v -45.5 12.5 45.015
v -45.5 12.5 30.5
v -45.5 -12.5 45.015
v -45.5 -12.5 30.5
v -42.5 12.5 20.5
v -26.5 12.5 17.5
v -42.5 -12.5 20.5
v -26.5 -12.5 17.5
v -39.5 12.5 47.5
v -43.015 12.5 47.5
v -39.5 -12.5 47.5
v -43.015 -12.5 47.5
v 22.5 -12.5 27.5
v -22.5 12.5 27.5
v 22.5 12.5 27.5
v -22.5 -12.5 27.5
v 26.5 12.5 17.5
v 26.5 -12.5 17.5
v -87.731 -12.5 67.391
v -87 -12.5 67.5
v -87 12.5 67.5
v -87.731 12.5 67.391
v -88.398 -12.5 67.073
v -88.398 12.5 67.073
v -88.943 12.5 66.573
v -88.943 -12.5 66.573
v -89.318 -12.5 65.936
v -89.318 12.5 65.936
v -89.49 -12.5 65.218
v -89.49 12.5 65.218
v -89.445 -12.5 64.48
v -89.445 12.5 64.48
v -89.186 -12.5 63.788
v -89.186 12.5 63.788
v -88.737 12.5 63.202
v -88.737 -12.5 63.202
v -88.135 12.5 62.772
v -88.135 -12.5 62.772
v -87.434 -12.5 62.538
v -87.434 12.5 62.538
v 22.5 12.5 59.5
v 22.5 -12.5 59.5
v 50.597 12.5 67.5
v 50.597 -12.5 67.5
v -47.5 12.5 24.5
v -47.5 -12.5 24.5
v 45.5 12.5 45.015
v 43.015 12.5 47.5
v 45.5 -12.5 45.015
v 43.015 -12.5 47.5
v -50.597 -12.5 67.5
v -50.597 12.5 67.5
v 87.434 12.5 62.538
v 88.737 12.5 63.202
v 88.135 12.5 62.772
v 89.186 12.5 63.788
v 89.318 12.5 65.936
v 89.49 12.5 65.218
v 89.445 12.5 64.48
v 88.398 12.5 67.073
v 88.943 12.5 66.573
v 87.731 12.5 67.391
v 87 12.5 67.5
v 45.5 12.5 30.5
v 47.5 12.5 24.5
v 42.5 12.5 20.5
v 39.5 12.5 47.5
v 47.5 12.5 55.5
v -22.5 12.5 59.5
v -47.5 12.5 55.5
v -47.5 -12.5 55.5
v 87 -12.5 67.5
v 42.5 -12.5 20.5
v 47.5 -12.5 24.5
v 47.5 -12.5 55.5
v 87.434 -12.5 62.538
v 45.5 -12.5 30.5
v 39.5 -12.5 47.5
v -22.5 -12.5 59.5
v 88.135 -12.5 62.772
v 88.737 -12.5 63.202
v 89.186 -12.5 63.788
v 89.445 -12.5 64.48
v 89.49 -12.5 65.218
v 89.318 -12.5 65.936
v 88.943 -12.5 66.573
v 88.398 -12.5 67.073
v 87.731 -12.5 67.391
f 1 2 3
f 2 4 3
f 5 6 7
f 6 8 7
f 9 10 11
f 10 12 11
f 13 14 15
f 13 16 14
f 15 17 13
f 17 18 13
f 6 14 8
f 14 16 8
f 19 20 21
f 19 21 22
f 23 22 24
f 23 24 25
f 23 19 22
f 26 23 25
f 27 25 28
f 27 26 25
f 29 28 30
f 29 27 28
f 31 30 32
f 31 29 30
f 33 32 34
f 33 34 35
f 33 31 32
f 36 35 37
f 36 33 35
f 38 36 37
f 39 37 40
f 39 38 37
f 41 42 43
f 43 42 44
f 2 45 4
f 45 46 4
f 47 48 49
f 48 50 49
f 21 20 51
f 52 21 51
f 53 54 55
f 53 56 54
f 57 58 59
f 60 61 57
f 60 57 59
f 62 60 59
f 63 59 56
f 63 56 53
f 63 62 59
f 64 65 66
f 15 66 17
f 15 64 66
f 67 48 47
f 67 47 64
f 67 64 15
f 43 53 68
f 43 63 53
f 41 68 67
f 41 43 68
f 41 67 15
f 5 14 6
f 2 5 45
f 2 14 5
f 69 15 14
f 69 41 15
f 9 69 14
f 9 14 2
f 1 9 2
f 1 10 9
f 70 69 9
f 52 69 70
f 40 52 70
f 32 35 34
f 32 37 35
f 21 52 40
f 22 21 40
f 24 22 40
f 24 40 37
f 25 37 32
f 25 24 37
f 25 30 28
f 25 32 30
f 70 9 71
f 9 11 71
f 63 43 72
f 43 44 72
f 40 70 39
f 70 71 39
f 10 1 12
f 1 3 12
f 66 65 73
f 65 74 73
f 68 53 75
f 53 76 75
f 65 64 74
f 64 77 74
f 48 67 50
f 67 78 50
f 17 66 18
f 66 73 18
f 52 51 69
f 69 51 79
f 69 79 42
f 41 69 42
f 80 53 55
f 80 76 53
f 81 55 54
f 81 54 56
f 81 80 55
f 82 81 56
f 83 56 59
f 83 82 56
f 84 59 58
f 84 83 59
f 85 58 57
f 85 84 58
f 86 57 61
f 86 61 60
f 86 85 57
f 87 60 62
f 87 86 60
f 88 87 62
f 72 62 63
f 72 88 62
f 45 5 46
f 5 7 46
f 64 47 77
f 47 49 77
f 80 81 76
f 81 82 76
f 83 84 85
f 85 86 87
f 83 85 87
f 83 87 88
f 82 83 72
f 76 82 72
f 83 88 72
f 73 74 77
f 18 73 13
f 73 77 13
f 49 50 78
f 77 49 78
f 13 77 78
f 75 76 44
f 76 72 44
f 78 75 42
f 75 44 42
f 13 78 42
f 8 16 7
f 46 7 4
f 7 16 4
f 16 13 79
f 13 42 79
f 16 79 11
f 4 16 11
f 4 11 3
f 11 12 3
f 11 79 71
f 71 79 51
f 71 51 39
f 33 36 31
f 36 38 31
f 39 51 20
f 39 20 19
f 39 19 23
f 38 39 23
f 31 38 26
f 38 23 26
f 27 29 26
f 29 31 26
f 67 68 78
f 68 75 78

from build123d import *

# Parameters (mm, degrees)
PAD002_DEPTH = 12.5


with BuildPart() as part:
    # Sketch003 → Pad002 (new body, symmetric)
    with BuildSketch(Plane.XZ):
        with BuildLine():
            Line((-22.5, 59.5), (22.5, 59.5))
            Line((22.5, 59.5), (50.596605, 67.5))
            Line((50.596605, 67.5), (87, 67.5))
            ThreePointArc((87.433912, 62.537944), (89.490496, 65.217784), (87, 67.5))
            Line((87.433912, 62.537944), (47.5, 55.5))
            Line((47.5, 55.5), (39.5, 47.5))
            Line((39.5, 47.5), (43.014719, 47.5))
            Line((43.014719, 47.5), (45.5, 45.014719))
            Line((45.5, 45.014719), (45.5, 30.5))
            Line((45.5, 30.5), (47.5, 24.5))
            Line((47.5, 24.5), (42.5, 20.5))
            Line((42.5, 20.5), (26.5, 17.5))
            Line((26.5, 17.5), (22.5, 27.5))
            Line((-22.5, 27.5), (22.5, 27.5))
            Line((-22.5, 27.5), (-26.5, 17.5))
            Line((-26.5, 17.5), (-42.5, 20.5))
            Line((-42.5, 20.5), (-47.5, 24.5))
            Line((-47.5, 24.5), (-45.5, 30.5))
            Line((-45.5, 30.5), (-45.5, 45.014719))
            Line((-45.5, 45.014719), (-43.014719, 47.5))
            Line((-43.014719, 47.5), (-39.5, 47.5))
            Line((-39.5, 47.5), (-47.5, 55.5))
            Line((-47.5, 55.5), (-87.433912, 62.537944))
            ThreePointArc((-87, 67.5), (-89.490496, 65.217784), (-87.433912, 62.537944))
            Line((-87, 67.5), (-50.596605, 67.5))
            Line((-50.596605, 67.5), (-22.5, 59.5))
        make_face()
    extrude(amount=PAD002_DEPTH, both=True)


solid = part.part
